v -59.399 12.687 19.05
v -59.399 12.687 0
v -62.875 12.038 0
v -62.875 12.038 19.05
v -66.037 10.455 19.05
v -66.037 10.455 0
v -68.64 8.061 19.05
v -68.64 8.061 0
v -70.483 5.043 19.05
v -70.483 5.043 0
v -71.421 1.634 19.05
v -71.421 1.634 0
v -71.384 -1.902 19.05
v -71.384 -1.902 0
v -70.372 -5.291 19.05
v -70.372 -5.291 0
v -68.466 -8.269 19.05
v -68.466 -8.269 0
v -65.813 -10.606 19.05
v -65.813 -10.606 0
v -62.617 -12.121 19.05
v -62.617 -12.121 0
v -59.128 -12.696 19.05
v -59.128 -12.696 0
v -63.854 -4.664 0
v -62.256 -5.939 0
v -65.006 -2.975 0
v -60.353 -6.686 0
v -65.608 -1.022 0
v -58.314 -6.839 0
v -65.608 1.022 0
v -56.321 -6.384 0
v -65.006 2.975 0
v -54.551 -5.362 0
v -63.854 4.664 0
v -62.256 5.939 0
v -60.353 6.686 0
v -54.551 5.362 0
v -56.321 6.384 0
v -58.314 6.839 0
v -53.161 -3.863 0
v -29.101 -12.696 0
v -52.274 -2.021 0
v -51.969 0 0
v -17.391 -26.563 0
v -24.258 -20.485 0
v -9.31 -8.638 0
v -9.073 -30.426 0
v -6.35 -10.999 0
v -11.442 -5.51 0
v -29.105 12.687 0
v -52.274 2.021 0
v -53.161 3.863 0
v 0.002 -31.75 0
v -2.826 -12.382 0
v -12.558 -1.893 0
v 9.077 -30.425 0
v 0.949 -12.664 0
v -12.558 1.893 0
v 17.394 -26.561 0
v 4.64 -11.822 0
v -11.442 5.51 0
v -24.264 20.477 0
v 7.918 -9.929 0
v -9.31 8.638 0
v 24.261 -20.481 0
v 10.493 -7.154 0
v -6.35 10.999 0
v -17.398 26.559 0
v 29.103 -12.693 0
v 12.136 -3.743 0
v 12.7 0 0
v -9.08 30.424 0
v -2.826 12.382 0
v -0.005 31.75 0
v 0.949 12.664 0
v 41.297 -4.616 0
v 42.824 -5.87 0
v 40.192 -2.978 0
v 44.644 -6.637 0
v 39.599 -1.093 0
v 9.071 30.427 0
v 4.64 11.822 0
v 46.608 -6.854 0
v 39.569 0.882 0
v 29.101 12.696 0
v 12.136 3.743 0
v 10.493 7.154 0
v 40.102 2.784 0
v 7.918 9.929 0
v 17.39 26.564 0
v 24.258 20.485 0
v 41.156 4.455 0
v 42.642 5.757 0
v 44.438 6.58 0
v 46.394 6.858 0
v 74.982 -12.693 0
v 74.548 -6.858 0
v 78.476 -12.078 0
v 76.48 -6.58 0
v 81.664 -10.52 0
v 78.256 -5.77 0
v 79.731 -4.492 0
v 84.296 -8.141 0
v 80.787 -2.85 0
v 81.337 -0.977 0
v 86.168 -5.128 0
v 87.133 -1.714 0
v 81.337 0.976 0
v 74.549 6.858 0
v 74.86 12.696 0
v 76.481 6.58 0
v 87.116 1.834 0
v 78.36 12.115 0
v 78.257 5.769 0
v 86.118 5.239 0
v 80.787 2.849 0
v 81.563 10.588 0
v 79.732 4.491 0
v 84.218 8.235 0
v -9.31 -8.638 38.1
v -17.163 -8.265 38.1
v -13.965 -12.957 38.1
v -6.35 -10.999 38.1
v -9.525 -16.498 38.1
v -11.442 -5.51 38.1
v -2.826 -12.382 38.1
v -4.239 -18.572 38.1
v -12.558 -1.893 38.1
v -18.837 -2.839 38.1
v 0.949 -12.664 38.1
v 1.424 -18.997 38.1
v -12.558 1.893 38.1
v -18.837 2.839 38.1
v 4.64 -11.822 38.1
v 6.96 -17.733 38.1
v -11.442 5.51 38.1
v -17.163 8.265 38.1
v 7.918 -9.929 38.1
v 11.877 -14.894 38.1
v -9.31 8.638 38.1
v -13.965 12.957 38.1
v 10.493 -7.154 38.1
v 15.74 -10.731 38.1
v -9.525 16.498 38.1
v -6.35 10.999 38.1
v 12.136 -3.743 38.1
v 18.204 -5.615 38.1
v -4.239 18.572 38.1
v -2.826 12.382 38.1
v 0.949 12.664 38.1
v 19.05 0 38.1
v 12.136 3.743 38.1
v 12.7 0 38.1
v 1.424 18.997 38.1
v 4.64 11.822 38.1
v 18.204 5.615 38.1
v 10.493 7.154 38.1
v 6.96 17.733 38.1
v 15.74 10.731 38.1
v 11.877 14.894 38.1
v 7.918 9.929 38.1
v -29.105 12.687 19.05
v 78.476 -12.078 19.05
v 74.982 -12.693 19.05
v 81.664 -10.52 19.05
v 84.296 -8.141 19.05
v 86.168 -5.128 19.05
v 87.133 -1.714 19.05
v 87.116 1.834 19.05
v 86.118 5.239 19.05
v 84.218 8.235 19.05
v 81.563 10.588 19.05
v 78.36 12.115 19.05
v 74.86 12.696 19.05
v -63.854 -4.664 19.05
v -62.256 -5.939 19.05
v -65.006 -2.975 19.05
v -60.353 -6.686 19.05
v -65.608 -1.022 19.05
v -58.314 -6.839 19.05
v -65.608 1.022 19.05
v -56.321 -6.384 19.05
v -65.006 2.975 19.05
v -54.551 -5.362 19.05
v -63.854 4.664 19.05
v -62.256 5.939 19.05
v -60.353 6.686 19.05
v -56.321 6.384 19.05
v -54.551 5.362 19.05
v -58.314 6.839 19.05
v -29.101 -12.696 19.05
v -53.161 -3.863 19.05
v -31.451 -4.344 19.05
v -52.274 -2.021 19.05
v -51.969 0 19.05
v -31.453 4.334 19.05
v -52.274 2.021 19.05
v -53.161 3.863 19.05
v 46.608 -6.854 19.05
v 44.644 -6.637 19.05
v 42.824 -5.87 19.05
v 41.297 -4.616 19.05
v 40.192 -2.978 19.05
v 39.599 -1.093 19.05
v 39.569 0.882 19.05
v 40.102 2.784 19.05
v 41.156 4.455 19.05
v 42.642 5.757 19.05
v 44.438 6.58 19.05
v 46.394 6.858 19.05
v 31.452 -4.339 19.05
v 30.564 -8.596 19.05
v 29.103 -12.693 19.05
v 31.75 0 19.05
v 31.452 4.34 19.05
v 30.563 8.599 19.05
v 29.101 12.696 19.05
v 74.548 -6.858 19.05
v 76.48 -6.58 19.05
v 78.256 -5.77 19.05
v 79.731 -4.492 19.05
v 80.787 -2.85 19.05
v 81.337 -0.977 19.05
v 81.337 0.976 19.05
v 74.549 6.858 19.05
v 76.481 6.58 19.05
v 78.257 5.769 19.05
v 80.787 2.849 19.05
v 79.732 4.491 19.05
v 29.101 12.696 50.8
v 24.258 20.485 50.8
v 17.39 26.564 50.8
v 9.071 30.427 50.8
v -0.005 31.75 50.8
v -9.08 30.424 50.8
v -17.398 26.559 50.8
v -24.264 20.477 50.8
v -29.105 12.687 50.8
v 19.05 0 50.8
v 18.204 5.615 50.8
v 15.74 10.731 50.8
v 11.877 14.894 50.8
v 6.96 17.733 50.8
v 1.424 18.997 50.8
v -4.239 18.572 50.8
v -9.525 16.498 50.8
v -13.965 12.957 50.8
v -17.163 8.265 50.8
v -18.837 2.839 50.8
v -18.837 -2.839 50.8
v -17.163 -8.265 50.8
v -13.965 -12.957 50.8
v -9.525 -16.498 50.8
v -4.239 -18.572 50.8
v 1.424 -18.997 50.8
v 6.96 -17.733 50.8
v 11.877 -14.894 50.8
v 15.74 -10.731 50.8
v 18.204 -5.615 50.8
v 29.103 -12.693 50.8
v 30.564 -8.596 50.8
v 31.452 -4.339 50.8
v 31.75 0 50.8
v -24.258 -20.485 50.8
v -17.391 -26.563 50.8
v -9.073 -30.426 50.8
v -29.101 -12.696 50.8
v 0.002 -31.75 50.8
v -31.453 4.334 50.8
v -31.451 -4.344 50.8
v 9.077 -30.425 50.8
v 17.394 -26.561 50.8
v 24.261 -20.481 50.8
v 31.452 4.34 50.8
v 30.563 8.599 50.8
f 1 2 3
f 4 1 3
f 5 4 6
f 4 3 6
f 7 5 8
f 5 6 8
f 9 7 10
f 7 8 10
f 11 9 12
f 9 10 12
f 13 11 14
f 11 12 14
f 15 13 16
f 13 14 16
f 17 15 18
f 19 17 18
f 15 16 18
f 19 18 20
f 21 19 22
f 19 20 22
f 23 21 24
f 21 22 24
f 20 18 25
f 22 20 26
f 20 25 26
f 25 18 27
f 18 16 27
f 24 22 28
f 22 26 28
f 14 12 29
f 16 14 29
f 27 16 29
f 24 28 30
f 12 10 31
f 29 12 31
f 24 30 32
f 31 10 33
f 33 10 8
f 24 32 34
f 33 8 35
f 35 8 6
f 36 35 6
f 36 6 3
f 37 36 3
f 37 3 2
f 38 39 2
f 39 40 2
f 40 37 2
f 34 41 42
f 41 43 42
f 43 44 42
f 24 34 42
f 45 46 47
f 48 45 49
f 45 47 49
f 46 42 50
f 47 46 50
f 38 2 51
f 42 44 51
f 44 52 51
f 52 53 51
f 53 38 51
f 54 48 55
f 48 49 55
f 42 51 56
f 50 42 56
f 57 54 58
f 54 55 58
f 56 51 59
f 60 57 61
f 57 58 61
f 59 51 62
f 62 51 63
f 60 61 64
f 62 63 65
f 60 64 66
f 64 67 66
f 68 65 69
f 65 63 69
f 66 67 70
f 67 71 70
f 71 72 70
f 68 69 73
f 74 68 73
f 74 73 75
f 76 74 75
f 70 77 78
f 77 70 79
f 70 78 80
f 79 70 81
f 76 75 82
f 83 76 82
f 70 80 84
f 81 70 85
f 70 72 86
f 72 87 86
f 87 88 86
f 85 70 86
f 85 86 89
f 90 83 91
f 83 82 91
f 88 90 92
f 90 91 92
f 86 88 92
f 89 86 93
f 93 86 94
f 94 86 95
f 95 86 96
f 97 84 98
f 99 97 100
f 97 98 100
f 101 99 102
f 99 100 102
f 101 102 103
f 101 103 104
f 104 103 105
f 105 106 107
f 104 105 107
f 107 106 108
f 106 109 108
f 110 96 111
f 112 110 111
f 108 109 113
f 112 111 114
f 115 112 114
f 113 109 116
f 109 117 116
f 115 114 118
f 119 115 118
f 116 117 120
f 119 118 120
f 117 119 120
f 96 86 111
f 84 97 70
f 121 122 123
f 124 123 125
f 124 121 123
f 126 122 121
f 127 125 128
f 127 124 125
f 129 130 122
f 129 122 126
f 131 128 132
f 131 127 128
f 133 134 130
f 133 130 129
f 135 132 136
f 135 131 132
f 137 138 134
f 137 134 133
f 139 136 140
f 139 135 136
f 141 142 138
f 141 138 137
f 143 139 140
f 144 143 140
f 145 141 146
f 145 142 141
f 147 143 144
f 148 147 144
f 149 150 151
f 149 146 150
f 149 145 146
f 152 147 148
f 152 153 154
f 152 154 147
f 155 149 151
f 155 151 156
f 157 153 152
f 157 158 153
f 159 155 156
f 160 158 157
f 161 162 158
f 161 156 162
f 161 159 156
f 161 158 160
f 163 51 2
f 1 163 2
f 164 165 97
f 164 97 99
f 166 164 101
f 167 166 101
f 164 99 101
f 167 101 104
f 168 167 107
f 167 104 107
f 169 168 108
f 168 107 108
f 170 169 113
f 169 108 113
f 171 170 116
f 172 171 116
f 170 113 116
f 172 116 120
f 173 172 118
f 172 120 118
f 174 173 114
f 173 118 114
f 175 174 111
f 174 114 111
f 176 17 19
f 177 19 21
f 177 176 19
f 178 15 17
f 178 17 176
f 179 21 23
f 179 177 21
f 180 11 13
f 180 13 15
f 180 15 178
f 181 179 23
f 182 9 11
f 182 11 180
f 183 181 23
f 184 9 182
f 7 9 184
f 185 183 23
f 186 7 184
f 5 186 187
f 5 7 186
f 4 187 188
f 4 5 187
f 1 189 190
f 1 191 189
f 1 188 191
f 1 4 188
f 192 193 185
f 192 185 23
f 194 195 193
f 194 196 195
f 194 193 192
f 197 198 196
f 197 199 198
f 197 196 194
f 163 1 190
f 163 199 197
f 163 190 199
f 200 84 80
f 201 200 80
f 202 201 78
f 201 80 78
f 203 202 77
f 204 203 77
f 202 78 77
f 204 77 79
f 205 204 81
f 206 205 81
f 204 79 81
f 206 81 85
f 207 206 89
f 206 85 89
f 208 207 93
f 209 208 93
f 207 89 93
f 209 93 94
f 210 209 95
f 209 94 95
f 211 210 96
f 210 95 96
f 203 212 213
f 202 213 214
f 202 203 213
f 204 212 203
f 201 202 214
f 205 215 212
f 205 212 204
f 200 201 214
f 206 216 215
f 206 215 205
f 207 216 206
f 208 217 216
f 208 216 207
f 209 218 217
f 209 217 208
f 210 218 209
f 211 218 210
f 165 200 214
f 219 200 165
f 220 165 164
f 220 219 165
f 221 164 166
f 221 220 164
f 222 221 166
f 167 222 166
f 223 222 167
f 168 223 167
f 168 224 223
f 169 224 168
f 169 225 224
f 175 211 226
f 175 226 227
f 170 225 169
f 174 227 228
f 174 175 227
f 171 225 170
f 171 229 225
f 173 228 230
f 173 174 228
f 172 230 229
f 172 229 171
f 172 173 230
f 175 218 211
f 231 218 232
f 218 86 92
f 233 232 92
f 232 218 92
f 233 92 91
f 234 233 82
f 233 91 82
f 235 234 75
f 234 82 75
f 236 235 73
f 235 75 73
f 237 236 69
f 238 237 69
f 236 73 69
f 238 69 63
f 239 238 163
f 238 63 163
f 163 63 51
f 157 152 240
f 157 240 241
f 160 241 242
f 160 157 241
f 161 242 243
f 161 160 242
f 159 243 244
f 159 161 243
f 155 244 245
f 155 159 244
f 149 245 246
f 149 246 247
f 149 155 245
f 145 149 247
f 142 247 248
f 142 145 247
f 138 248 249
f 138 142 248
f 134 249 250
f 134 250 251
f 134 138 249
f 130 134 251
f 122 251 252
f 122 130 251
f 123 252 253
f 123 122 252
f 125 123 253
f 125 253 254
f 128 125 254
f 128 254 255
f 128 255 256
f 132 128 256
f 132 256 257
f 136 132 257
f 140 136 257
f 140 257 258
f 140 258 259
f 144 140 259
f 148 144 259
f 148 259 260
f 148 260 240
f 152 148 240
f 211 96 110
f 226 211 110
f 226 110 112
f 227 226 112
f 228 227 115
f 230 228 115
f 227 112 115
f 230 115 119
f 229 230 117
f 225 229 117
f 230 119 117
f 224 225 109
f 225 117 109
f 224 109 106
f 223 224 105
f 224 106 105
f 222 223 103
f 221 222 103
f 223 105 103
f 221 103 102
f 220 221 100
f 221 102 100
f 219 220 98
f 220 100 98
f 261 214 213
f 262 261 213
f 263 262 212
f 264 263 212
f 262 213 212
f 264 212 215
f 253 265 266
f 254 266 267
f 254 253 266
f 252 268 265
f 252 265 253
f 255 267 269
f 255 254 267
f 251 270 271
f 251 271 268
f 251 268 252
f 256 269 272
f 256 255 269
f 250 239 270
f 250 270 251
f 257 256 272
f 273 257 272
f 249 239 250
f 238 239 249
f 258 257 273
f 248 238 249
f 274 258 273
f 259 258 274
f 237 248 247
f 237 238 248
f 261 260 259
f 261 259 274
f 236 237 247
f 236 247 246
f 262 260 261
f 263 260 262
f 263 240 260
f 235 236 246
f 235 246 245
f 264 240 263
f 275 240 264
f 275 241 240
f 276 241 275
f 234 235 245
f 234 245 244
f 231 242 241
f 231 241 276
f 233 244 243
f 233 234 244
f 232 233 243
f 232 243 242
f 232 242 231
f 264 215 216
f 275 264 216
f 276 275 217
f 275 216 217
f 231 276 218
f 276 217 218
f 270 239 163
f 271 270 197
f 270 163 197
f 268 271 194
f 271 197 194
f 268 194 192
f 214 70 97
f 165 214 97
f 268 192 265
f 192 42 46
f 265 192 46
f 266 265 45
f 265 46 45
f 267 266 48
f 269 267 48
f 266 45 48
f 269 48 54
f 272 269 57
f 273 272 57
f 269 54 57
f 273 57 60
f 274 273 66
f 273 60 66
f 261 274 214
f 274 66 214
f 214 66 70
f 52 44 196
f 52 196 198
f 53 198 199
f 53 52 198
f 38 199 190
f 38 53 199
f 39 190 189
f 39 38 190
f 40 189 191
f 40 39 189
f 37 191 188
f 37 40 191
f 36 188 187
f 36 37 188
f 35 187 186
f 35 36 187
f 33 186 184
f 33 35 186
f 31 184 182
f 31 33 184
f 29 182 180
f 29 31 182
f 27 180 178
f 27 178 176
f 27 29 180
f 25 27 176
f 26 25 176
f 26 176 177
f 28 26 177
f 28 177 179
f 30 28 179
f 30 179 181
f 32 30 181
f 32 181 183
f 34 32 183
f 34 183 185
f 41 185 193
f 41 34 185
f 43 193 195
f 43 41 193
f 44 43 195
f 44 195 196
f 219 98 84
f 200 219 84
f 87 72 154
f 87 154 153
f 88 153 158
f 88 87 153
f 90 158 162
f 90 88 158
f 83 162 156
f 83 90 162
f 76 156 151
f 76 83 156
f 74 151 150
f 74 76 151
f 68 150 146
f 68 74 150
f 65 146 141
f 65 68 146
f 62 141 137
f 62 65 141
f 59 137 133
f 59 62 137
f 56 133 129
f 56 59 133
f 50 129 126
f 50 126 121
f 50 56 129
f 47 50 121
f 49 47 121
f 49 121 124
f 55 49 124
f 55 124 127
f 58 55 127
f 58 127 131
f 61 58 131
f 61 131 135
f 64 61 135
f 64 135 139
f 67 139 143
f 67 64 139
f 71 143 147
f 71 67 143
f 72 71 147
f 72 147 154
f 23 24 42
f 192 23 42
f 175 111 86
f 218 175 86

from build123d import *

# Parameters (mm, degrees)
F0_R     = 19.05
F1_DEPTH = 50.8
F0_R_2   = 6.857792
F2_DEPTH = 19.05
F3_DEPTH = 19.05
F0_R_3   = 12.7
F4_DEPTH = 38.1


with BuildPart() as f1:
    # F0 (on Top) → F1 (new body)
    with BuildSketch(Plane.XY):
        with BuildLine():
            ThreePointArc((29.102578, -12.692613), (31.081098, -6.482887), (31.75, 0))
            ThreePointArc((31.75, 0), (31.080701, 6.484792), (29.101022, 12.696182))
            ThreePointArc((29.101022, 12.696182), (-0.00495, 31.75), (-29.10498, 12.687106))
            ThreePointArc((-29.10498, 12.687106), (-31.75, -0.005082), (-29.100917, -12.696423))
            ThreePointArc((-29.100917, -12.696423), (0.002078, -31.75), (29.102578, -12.692613))
        make_face()
        Circle(F0_R, mode=Mode.SUBTRACT)
    extrude(amount=F1_DEPTH)

    # F0 (on Top) → F2 (join)
    with BuildSketch(Plane.XY):
        with BuildLine():
            ThreePointArc((-29.100917, -12.696423), (-31.75, -0.005082), (-29.10498, 12.687106))
            Line((-29.10498, 12.687106), (-58.254777, 12.687106))
            Line((-58.254777, 12.687106), (-59.399047, 12.687106))
            ThreePointArc((-59.399047, 12.687106), (-71.52619, -0.135445), (-59.128318, -12.696423))
            Line((-59.128318, -12.696423), (-58.525507, -12.696423))
            Line((-58.525507, -12.696423), (-29.100917, -12.696423))
        make_face()
        with Locations((-58.826912, 0)):
            Circle(F0_R_2, mode=Mode.SUBTRACT)
    extrude(amount=F2_DEPTH)

    # F0 (on Top) → F3 (join)
    with BuildSketch(Plane.XY):
        with BuildLine():
            ThreePointArc((29.101022, 12.696182), (31.080701, 6.484792), (31.75, 0))
            ThreePointArc((31.75, 0), (31.081098, -6.482887), (29.102578, -12.692613))
            Line((29.102578, -12.692613), (74.115909, -12.692613))
            Line((74.115909, -12.692613), (74.982091, -12.692613))
            ThreePointArc((74.982091, -12.692613), (87.248854, 0.060869), (74.860406, 12.696182))
            Line((74.860406, 12.696182), (74.237594, 12.696182))
            Line((74.237594, 12.696182), (29.101022, 12.696182))
        make_face()
        with BuildLine():
            ThreePointArc((74.548989, 6.858), (81.407, -0.000503), (74.547984, -6.858))
            Line((74.547984, -6.858), (46.607984, -6.853861))
            ThreePointArc((46.607984, -6.853861), (39.512576, -0.106876), (46.394271, 6.857956))
            Line((46.394271, 6.857956), (74.548989, 6.858))
        make_face(mode=Mode.SUBTRACT)
    extrude(amount=F3_DEPTH)

    # F0 (on Top) → F4 (join)
    with BuildSketch(Plane.XY):
        Circle(F0_R)
        Circle(F0_R_3, mode=Mode.SUBTRACT)
    extrude(amount=F4_DEPTH)


solid = f1.part
